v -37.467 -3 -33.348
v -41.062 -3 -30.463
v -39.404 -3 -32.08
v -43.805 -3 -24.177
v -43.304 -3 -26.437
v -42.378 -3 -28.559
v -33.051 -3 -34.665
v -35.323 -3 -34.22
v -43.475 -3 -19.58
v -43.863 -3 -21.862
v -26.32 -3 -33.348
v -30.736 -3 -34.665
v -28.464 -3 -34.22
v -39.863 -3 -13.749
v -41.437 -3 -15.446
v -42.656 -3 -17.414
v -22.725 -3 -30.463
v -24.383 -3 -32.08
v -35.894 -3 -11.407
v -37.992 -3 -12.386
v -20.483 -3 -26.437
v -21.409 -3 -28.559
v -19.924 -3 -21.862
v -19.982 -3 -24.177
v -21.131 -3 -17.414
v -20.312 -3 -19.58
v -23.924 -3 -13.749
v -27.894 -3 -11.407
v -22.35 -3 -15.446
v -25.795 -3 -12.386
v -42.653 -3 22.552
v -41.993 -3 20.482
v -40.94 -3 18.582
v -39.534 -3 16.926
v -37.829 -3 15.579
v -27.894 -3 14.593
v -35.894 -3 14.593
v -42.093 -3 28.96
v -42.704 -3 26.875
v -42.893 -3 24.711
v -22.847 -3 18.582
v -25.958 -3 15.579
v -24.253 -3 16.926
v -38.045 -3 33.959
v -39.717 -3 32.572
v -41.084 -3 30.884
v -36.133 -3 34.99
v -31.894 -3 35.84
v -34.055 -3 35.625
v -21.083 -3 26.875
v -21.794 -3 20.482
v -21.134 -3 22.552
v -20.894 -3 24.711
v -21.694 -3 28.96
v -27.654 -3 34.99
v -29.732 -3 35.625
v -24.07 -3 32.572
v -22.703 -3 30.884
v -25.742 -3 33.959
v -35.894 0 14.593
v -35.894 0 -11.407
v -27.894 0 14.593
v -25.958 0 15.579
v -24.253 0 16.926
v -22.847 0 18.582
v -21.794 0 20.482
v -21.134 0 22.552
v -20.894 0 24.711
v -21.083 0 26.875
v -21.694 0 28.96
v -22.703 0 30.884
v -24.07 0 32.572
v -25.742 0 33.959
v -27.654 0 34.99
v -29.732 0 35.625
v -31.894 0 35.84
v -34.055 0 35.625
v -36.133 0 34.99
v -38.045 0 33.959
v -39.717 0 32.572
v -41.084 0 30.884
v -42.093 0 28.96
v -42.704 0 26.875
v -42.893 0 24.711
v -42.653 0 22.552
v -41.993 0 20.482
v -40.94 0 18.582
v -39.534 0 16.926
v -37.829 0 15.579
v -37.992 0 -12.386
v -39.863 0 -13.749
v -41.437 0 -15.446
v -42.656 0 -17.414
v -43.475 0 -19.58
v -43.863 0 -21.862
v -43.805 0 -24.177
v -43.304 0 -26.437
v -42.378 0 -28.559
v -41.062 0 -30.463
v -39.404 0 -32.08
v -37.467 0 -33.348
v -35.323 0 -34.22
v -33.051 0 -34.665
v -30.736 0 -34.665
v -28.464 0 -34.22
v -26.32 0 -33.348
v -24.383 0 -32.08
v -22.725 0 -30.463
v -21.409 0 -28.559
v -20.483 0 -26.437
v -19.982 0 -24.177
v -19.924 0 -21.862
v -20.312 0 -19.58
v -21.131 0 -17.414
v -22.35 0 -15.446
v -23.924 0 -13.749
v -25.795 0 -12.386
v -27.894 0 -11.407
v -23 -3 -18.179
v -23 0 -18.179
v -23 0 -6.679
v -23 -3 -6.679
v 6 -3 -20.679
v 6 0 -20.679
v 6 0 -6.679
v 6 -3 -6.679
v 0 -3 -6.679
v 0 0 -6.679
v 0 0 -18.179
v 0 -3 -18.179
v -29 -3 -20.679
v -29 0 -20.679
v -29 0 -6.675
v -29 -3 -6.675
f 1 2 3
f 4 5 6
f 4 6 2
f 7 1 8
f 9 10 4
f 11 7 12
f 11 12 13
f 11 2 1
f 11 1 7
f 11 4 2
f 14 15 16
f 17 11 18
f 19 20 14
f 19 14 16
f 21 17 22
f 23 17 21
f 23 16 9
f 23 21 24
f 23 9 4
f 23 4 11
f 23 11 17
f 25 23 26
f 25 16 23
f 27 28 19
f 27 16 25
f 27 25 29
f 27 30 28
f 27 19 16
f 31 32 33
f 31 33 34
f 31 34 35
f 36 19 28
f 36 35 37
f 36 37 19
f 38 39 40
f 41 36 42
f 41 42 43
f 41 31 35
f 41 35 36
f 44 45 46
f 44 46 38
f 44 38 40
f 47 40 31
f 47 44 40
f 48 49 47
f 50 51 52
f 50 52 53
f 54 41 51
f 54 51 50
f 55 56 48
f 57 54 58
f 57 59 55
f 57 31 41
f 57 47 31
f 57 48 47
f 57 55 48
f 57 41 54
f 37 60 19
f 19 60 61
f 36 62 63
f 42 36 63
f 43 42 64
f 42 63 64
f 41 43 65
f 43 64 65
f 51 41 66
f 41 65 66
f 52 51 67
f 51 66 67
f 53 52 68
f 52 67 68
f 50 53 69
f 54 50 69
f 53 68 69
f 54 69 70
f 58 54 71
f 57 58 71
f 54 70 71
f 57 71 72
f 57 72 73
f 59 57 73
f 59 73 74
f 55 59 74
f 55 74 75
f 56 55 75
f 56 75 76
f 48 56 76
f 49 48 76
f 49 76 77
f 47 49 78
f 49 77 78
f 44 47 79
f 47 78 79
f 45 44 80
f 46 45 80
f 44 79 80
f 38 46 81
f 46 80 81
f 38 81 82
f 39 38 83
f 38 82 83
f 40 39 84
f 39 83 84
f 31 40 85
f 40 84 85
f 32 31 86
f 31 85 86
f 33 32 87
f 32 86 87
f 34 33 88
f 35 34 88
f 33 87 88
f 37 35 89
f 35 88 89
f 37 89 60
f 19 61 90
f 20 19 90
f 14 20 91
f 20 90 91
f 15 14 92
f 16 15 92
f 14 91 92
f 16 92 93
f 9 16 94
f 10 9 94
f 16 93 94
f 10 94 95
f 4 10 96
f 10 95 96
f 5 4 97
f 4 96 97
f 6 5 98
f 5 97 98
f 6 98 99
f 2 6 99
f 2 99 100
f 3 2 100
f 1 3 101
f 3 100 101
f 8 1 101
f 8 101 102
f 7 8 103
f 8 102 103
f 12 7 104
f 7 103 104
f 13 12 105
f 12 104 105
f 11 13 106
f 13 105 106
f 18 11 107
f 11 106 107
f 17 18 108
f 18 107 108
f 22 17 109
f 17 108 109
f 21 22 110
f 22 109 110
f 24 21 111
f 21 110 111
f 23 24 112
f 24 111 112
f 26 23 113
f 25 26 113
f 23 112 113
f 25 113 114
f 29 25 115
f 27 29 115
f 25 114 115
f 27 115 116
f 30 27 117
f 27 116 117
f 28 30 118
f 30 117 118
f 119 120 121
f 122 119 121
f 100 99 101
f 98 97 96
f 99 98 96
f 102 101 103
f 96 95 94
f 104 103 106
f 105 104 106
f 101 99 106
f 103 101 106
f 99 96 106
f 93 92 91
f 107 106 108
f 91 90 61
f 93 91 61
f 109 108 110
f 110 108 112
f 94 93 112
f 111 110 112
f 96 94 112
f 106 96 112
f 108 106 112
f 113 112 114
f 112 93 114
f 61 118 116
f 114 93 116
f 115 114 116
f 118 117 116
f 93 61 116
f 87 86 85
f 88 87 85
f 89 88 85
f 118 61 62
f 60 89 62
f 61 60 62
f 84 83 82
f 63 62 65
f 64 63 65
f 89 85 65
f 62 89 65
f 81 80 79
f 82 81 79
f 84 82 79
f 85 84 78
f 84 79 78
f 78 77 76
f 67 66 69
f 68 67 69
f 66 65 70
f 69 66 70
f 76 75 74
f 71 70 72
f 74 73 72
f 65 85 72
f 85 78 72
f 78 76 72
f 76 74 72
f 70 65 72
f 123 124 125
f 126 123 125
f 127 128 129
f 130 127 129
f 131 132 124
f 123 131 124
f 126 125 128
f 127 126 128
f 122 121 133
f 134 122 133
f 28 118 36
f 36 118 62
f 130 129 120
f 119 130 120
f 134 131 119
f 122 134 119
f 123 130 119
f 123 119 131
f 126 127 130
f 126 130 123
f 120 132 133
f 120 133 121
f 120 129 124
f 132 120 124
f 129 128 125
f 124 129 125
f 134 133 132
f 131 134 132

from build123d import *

# Parameters (mm, degrees)
F1_DEPTH = 3
F3_DEPTH = 3


with BuildPart() as f1:
    # F0 (on Front) → F1 (new body)
    with BuildSketch(Plane.XZ):
        Polygon((-29, -6.674529), (-29, -20.678958), (6, -20.678958), (6, -6.678958), (0, -6.678958), (0, -18.178958), (-23, -18.178958), (-23, -6.678958), align=None)
    extrude(amount=F1_DEPTH)


with BuildPart() as f3:
    # F2 (on Front) → F3 (new body)
    with BuildSketch(Plane.XZ):
        with BuildLine():
            ThreePointArc((-27.893543, 14.592959), (-31.893543, 35.83991), (-35.893543, 14.592959))
            Line((-35.893543, 14.592959), (-35.893543, -11.407041))
            ThreePointArc((-35.893543, -11.407041), (-31.893543, -34.72075), (-27.893543, -11.407041))
            Line((-27.893543, -11.407041), (-27.893543, 14.592959))
        make_face()
    extrude(amount=F3_DEPTH)


solid = Compound([f1.part, f3.part])
